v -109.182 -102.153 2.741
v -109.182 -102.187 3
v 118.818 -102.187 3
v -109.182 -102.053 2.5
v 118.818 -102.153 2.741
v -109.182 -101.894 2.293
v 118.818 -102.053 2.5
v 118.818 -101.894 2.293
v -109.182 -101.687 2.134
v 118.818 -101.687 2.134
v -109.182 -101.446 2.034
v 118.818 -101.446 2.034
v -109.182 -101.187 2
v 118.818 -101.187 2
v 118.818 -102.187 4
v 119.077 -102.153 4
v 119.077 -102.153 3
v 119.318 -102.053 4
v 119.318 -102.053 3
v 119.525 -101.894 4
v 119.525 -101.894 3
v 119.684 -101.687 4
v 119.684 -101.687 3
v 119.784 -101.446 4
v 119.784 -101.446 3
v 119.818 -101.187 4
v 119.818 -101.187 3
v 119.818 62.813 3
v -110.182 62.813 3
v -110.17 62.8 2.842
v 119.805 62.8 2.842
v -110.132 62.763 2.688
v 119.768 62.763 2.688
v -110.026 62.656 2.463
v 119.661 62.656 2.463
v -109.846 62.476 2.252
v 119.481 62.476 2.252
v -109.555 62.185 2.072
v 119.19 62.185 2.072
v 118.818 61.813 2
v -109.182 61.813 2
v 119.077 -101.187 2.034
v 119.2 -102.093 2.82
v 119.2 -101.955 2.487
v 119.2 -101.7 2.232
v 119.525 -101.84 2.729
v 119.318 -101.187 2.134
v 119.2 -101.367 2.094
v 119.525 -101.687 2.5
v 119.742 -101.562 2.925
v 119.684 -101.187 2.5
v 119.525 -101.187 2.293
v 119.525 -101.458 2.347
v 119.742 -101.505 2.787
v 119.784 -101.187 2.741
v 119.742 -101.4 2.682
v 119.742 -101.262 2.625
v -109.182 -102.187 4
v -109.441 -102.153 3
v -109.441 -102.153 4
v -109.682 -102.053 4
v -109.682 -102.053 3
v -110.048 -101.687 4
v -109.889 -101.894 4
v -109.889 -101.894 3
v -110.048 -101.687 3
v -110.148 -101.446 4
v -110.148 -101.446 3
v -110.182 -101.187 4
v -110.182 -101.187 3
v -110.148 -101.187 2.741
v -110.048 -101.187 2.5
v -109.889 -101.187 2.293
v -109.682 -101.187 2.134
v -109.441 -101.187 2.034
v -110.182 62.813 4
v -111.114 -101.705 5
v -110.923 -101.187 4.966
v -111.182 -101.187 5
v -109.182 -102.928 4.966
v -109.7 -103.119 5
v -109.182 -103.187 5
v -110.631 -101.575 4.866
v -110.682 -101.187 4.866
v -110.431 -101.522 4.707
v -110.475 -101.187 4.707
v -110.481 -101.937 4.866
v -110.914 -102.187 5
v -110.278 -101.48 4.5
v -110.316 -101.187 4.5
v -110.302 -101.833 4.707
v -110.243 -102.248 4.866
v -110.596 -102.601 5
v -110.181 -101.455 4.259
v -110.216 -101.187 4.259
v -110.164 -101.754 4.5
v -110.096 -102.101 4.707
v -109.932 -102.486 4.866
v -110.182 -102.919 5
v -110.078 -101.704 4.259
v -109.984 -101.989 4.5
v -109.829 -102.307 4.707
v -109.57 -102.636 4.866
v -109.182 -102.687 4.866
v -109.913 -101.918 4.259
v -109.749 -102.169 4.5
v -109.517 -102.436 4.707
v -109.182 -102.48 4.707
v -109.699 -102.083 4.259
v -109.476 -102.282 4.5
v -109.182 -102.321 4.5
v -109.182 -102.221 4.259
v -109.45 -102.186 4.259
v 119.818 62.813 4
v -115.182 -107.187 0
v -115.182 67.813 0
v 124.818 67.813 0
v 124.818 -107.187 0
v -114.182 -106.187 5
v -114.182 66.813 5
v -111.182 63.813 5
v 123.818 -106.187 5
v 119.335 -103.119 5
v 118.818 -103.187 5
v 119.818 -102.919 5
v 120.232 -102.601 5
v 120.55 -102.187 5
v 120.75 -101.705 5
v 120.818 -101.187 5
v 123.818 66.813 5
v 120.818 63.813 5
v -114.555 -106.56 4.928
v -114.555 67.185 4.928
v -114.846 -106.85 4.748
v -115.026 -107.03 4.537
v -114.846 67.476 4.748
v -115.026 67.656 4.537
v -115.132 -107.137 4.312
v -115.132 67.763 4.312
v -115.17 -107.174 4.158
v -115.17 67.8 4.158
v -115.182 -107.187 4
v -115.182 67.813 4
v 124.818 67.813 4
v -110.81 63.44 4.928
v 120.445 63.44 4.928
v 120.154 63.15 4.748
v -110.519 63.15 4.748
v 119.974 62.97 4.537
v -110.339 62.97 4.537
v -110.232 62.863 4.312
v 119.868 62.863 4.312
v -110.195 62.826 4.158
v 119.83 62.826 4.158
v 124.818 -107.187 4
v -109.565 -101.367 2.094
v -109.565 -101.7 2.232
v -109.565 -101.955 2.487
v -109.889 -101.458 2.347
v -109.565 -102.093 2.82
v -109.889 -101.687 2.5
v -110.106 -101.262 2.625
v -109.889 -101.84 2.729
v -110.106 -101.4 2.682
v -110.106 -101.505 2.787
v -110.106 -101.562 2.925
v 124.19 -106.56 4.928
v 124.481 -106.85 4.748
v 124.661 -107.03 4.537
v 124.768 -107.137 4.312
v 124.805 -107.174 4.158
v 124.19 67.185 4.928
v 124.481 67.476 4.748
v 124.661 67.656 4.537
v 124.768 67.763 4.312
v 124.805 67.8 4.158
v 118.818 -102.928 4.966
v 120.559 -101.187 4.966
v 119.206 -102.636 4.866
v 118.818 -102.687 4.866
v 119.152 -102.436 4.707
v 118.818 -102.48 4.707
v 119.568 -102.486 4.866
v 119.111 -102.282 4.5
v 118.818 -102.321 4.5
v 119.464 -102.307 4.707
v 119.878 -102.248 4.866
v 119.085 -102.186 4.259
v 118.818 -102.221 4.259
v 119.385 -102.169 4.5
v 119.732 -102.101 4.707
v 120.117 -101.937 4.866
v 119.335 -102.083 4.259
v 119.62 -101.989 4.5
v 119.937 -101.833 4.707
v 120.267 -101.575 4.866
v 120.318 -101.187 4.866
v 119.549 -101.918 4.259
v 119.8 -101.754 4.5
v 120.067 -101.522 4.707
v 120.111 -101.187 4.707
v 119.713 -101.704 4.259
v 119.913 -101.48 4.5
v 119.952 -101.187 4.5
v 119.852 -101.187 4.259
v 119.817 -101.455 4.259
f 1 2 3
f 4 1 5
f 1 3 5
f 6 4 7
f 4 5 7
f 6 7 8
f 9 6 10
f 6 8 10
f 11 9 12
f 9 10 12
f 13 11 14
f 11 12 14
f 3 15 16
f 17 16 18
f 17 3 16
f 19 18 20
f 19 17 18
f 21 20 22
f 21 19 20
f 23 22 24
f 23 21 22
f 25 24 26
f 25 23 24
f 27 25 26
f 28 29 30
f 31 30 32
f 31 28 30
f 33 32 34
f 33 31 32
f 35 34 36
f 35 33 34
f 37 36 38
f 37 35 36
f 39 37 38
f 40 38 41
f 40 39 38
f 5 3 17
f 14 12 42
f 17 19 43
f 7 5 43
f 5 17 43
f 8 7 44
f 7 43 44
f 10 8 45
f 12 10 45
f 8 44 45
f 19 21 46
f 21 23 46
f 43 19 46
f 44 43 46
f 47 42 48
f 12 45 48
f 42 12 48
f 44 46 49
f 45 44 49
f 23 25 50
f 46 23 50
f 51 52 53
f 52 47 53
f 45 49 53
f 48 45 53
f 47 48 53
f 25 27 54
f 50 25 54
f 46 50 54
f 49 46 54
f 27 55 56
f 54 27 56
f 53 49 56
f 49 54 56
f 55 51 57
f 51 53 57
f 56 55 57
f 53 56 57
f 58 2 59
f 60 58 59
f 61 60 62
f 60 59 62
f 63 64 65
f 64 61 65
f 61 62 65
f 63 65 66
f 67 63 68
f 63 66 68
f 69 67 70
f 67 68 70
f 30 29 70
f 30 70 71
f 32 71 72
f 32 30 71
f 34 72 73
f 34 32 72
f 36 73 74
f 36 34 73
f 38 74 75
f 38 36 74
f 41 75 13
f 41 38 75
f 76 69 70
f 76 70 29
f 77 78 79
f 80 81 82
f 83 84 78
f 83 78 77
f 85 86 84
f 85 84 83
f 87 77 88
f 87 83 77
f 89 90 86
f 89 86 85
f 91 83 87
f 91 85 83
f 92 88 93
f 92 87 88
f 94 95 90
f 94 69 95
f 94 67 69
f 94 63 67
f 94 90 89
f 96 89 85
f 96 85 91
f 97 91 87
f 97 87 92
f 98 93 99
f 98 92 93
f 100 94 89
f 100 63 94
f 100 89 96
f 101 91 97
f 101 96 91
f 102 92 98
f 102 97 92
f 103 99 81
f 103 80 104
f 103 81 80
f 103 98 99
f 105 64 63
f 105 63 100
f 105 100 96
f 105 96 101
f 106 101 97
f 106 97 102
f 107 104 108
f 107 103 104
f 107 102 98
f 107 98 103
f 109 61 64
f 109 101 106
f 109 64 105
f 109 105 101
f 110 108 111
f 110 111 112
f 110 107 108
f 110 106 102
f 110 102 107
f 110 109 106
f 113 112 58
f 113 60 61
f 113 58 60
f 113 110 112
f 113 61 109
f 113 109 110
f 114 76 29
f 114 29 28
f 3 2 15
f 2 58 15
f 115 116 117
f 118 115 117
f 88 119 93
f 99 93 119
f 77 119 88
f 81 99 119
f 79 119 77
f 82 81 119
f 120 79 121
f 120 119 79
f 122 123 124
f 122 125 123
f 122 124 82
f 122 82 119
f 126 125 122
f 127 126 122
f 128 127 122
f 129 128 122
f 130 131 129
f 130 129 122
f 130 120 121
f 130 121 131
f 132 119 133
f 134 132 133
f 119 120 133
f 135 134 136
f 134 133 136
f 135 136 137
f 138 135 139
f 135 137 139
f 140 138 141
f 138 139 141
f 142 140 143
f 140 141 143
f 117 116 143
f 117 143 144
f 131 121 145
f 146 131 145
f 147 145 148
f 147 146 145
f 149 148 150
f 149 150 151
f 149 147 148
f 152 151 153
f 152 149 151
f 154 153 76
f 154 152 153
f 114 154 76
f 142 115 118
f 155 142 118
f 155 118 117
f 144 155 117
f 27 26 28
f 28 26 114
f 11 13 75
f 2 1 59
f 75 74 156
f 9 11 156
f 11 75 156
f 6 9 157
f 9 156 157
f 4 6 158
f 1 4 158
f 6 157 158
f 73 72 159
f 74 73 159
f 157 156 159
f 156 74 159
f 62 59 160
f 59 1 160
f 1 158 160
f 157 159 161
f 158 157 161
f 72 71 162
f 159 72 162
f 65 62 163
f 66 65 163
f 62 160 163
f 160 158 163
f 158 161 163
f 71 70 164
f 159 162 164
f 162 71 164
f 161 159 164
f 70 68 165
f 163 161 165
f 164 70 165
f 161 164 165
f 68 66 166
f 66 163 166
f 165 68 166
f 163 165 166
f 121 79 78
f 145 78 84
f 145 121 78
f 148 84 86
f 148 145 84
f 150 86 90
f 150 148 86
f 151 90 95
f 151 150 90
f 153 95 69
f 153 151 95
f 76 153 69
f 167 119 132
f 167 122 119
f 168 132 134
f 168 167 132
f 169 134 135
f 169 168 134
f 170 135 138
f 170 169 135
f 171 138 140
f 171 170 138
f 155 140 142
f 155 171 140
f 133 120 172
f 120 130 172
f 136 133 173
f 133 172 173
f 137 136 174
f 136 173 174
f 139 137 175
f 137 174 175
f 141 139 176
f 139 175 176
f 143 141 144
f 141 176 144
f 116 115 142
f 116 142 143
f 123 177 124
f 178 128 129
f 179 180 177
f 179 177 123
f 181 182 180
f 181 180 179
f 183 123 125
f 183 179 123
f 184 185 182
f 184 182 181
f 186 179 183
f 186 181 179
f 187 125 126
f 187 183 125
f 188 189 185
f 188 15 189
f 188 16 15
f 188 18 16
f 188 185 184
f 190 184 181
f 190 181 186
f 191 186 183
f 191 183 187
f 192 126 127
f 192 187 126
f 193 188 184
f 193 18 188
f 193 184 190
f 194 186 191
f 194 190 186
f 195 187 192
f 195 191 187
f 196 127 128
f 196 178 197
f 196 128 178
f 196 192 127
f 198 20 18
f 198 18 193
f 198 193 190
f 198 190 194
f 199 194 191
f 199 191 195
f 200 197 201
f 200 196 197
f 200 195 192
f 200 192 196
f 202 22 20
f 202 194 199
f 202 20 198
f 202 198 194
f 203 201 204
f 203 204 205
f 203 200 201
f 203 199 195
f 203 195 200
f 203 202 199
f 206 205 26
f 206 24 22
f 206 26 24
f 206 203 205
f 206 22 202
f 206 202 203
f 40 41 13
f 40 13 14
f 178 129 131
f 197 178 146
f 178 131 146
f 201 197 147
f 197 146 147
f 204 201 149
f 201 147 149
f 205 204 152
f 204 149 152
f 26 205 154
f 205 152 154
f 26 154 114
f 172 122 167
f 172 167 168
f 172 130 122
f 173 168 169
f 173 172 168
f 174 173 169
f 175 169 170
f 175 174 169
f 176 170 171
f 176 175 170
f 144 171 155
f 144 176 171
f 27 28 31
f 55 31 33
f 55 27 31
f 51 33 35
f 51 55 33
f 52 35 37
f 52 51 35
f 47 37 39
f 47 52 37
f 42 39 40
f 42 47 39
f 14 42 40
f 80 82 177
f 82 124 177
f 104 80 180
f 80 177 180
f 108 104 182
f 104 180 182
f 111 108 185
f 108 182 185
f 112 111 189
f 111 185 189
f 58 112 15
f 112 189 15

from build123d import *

# Parameters (mm, degrees)
SKETCH1_W           = 240
SKETCH1_H           = 175
BOSS_EXTRUDE1_DEPTH = 5
SKETCH2_W           = 230
SKETCH2_H           = 165
CUT_EXTRUDE1_DEPTH  = 3
FILLET1_R           = 1
FILLET2_R           = 1
FILLET3_R           = 1


with BuildPart() as part:
    # Sketch1 → Boss-Extrude1 (new body)
    with BuildSketch(Plane.XY):
        with Locations((4.817749604, -19.687004754)):
            Rectangle(SKETCH1_W, SKETCH1_H)
    extrude(amount=BOSS_EXTRUDE1_DEPTH)

    # Sketch2 → Cut-Extrude1 (cut)
    with BuildSketch(Plane.XY.offset(5)):
        with Locations((4.817749604, -19.687004754)):
            Rectangle(SKETCH2_W, SKETCH2_H)
    extrude(amount=-CUT_EXTRUDE1_DEPTH, mode=Mode.SUBTRACT)

    # Fillet1
    fillet1_edges = [part.edges().sort_by_distance(p)[0] for p in [
        (4.817749604, -102.187004754, 2),
        (119.817749604, -102.187004754, 3.5),
        (-110.182250396, -102.187004754, 3.5),
        (4.817749604, 62.812995246, 5),
        (-110.182250396, -19.687004754, 5),
        (4.817749604, -102.187004754, 5),
        (119.817749604, -19.687004754, 5),
    ]]
    fillet(fillet1_edges, radius=FILLET1_R)

    # Fillet2
    fillet2_edges = [part.edges().sort_by_distance(p)[0] for p in [
        (124.817749604, -19.687004754, 5),
        (4.817749604, 67.812995246, 5),
        (-115.182250396, -19.687004754, 5),
        (4.817749604, -107.187004754, 5),
    ]]
    fillet(fillet2_edges, radius=FILLET2_R)

    # Fillet3
    # the kernel refuses this fillet: 1 mm, written as the material it adds along each edge
    with BuildSketch(Plane(origin=(118.817749604, -101.187004754, 3), x_dir=(0, 0, -1), z_dir=(1, 0, 0))) as fillet3_piece_1_section:
        Polygon((0, 0), (FILLET3_R, 0), (FILLET3_R, -FILLET3_R), (0, -FILLET3_R), align=None)
    fillet3_piece_1 = extrude(amount=FILLET3_R, mode=Mode.PRIVATE)
    fillet3_piece_1 = fillet3_piece_1 - Plane(origin=(118.817749604, -101.187004754, 3), x_dir=(0, 0.7071067811865475, 0.7071067811865475), z_dir=(1, 0, 0)) * Sphere(FILLET3_R, mode=Mode.PRIVATE)
    add(fillet3_piece_1)
    with BuildSketch(Plane(origin=(-109.182250396, -101.187004754, 3), x_dir=(0, 0, -1), z_dir=(-1, 0, 0))) as fillet3_piece_2_section:
        Polygon((0, 0), (FILLET3_R, 0), (FILLET3_R, FILLET3_R), (0, FILLET3_R), align=None)
    fillet3_piece_2 = extrude(amount=FILLET3_R, mode=Mode.PRIVATE)
    fillet3_piece_2 = fillet3_piece_2 - Plane(origin=(-109.182250396, -101.187004754, 3), x_dir=(0, 0.7071067811865475, 0.7071067811865475), z_dir=(-1, 0, 0)) * Sphere(FILLET3_R, mode=Mode.PRIVATE)
    add(fillet3_piece_2)
    with BuildSketch(Plane(origin=(122.317749604, 62.812995246, 2), x_dir=(0, 0, 1), z_dir=(-1, 0, 0))) as fillet3_piece_3:
        with BuildLine():
            CenterArc((FILLET3_R, -FILLET3_R), FILLET3_R, 90, 90)
            Line((0, -FILLET3_R), (0, 0))
            Line((0, 0), (FILLET3_R, 0))
        make_face()
    extrude(amount=235)
    with BuildSketch(Plane(origin=(-110.182250396, 65.312995246, 2), x_dir=(0, 0, 1), z_dir=(0, -1, 0)), Plane(origin=(119.817749604, -101.187004754, 2), x_dir=(0, 0, 1), z_dir=(0, 1, 0))) as fillet3_piece_4:
        with BuildLine():
            CenterArc((FILLET3_R, -FILLET3_R), FILLET3_R, 90, 90)
            Line((0, -FILLET3_R), (0, 0))
            Line((0, 0), (FILLET3_R, 0))
        make_face()
    extrude(amount=166.5)


solid = part.part
